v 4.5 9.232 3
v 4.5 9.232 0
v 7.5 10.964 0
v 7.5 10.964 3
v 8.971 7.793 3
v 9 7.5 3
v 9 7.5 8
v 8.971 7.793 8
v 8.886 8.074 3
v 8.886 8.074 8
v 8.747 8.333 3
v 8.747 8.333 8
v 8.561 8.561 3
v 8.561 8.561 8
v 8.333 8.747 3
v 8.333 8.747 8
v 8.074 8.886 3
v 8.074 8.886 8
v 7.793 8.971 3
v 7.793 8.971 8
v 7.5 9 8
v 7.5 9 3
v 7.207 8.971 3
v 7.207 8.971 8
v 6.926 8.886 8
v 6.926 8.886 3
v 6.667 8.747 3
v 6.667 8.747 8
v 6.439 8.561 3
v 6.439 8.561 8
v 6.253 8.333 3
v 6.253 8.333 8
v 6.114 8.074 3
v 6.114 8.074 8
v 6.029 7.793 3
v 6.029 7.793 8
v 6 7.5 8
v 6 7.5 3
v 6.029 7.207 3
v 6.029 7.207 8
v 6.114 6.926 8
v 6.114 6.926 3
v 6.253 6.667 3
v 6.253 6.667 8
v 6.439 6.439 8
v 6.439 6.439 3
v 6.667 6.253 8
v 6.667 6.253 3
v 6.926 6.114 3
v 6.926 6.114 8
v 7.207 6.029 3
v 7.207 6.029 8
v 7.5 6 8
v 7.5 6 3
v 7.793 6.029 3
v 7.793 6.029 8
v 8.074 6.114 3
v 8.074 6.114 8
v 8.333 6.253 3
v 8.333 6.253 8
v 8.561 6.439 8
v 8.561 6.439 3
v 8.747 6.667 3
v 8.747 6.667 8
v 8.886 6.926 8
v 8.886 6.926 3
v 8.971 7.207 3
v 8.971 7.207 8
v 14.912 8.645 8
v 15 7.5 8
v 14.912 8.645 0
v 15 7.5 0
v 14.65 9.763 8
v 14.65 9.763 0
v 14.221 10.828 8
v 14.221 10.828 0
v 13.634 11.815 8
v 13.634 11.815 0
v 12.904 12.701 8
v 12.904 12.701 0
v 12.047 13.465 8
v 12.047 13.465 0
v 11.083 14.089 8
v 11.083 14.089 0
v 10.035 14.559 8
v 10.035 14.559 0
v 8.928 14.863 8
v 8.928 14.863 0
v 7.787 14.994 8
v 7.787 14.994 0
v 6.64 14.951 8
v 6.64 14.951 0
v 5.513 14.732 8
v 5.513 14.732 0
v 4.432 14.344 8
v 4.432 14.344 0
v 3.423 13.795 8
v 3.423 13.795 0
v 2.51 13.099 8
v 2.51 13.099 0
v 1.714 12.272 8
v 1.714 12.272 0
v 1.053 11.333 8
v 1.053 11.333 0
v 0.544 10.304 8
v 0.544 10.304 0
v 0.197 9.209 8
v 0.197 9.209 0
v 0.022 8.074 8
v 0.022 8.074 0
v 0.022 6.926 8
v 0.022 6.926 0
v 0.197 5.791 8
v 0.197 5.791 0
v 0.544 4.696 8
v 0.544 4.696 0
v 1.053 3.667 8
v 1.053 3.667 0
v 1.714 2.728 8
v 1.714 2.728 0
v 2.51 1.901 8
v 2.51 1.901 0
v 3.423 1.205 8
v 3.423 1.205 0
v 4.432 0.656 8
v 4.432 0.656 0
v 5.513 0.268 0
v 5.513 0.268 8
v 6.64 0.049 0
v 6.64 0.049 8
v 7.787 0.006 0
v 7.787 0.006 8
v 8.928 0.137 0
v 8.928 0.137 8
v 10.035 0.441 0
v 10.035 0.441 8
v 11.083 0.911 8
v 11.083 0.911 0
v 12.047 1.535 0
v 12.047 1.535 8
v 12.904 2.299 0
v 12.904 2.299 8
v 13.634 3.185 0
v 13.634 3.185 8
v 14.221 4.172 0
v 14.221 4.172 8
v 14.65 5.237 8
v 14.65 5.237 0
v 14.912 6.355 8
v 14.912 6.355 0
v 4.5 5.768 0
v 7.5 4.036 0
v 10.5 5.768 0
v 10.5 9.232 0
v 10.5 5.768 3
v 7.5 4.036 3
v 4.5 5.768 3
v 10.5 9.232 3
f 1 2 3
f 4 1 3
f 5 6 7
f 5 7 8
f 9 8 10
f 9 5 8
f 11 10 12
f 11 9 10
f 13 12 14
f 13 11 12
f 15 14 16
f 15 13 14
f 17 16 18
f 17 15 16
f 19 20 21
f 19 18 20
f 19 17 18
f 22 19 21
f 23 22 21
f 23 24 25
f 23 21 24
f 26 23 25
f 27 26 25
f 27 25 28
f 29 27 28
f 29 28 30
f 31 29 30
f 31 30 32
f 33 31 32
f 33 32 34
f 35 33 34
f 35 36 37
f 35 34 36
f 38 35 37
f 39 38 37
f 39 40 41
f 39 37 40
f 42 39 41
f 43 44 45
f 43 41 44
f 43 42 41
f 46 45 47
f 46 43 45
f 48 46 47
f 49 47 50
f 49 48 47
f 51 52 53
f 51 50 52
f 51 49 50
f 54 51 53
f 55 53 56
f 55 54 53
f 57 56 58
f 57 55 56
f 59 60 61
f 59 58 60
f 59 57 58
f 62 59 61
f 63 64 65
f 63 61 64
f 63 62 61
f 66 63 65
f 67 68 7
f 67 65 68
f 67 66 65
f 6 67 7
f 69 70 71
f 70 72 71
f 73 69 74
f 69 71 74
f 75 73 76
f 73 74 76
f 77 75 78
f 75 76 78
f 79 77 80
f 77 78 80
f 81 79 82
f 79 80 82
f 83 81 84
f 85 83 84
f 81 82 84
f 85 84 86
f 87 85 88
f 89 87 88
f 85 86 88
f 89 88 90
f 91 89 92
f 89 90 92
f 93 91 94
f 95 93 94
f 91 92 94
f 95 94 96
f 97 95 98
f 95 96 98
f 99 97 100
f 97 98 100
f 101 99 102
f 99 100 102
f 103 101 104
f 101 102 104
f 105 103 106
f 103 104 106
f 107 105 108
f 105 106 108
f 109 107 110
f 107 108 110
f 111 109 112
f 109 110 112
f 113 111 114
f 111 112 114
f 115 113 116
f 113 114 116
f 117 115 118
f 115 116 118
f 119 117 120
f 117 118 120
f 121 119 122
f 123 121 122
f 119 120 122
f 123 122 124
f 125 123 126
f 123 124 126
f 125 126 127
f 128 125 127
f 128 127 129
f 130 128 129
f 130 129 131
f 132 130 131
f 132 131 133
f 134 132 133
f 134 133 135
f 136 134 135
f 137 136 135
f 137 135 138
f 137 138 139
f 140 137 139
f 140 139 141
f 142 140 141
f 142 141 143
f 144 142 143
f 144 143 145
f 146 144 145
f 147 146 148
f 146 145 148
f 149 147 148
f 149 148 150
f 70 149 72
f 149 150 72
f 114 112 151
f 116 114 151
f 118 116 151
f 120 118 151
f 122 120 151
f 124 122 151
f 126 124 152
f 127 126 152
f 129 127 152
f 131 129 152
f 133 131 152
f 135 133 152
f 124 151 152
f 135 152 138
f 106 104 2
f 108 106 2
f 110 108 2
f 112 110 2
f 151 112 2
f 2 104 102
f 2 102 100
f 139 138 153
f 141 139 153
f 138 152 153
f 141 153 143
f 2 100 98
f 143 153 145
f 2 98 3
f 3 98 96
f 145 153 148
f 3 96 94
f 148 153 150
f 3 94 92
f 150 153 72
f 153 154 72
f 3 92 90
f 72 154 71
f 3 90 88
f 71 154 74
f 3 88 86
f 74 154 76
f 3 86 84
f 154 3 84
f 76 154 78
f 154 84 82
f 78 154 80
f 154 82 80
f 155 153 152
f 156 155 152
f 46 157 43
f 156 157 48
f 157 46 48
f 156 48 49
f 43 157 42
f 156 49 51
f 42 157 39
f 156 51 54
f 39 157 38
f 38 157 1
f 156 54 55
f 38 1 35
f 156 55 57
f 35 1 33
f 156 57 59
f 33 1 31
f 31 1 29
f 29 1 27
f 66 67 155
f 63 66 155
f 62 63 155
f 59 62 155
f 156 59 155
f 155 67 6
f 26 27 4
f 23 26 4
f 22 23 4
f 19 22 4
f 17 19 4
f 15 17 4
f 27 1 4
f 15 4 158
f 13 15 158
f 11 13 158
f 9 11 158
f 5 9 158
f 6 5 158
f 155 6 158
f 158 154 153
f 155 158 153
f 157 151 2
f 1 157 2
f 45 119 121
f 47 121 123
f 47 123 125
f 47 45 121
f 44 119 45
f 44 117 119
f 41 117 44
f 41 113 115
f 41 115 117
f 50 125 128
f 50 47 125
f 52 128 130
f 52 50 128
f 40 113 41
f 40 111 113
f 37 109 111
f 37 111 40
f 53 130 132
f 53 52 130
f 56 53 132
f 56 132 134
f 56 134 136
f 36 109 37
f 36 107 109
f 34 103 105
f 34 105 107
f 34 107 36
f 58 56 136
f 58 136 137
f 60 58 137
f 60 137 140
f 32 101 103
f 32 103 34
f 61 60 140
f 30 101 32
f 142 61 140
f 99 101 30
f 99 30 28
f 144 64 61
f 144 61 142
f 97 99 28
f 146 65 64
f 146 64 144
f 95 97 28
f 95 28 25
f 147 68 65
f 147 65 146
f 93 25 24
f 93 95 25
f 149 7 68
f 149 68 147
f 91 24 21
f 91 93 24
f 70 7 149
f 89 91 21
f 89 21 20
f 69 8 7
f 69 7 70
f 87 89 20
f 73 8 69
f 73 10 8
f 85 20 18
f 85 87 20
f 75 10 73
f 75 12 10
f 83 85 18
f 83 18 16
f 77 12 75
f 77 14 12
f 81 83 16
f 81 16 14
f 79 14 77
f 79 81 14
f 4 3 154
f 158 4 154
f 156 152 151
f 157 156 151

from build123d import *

# Parameters (mm, degrees)
F0_R     = 7.5
F1_DEPTH = 3
F2_R     = 7.5
F3_DEPTH = 5
F0_R_2   = 1.5
F4_DEPTH = 25


with BuildPart() as f1:
    # F0 (on Top) → F1 (new body)
    with BuildSketch(Plane.XY):
        with Locations((7.5, 7.5)):
            Circle(F0_R)
        Polygon((7.5, 10.9641016151), (10.5, 9.2320508076), (10.5, 5.7679491924), (7.5, 4.0358983849), (4.5, 5.7679491924), (4.5, 9.2320508076), align=None, mode=Mode.SUBTRACT)
    extrude(amount=F1_DEPTH)

    # F2 (on face) → F3 (join)
    with BuildSketch(Plane.XY.offset(3)):
        with Locations((7.5, 7.5)):
            Circle(F2_R)
        Polygon((4.5, 5.7679491924), (4.5, 9.2320508076), (7.5, 10.9641016151), (10.5, 9.2320508076), (10.5, 5.7679491924), (7.5, 4.0358983849), align=None, mode=Mode.SUBTRACT)
        Polygon((7.5, 10.9641016151), (4.5, 9.2320508076), (4.5, 5.7679491924), (7.5, 4.0358983849), (10.5, 5.7679491924), (10.5, 9.2320508076), align=None)
    extrude(amount=F3_DEPTH)

    # F0 (on Top) → F4 (cut)
    with BuildSketch(Plane.XY):
        with Locations((7.5, 7.5)):
            Circle(F0_R_2)
    extrude(amount=F4_DEPTH, mode=Mode.SUBTRACT)


solid = f1.part
